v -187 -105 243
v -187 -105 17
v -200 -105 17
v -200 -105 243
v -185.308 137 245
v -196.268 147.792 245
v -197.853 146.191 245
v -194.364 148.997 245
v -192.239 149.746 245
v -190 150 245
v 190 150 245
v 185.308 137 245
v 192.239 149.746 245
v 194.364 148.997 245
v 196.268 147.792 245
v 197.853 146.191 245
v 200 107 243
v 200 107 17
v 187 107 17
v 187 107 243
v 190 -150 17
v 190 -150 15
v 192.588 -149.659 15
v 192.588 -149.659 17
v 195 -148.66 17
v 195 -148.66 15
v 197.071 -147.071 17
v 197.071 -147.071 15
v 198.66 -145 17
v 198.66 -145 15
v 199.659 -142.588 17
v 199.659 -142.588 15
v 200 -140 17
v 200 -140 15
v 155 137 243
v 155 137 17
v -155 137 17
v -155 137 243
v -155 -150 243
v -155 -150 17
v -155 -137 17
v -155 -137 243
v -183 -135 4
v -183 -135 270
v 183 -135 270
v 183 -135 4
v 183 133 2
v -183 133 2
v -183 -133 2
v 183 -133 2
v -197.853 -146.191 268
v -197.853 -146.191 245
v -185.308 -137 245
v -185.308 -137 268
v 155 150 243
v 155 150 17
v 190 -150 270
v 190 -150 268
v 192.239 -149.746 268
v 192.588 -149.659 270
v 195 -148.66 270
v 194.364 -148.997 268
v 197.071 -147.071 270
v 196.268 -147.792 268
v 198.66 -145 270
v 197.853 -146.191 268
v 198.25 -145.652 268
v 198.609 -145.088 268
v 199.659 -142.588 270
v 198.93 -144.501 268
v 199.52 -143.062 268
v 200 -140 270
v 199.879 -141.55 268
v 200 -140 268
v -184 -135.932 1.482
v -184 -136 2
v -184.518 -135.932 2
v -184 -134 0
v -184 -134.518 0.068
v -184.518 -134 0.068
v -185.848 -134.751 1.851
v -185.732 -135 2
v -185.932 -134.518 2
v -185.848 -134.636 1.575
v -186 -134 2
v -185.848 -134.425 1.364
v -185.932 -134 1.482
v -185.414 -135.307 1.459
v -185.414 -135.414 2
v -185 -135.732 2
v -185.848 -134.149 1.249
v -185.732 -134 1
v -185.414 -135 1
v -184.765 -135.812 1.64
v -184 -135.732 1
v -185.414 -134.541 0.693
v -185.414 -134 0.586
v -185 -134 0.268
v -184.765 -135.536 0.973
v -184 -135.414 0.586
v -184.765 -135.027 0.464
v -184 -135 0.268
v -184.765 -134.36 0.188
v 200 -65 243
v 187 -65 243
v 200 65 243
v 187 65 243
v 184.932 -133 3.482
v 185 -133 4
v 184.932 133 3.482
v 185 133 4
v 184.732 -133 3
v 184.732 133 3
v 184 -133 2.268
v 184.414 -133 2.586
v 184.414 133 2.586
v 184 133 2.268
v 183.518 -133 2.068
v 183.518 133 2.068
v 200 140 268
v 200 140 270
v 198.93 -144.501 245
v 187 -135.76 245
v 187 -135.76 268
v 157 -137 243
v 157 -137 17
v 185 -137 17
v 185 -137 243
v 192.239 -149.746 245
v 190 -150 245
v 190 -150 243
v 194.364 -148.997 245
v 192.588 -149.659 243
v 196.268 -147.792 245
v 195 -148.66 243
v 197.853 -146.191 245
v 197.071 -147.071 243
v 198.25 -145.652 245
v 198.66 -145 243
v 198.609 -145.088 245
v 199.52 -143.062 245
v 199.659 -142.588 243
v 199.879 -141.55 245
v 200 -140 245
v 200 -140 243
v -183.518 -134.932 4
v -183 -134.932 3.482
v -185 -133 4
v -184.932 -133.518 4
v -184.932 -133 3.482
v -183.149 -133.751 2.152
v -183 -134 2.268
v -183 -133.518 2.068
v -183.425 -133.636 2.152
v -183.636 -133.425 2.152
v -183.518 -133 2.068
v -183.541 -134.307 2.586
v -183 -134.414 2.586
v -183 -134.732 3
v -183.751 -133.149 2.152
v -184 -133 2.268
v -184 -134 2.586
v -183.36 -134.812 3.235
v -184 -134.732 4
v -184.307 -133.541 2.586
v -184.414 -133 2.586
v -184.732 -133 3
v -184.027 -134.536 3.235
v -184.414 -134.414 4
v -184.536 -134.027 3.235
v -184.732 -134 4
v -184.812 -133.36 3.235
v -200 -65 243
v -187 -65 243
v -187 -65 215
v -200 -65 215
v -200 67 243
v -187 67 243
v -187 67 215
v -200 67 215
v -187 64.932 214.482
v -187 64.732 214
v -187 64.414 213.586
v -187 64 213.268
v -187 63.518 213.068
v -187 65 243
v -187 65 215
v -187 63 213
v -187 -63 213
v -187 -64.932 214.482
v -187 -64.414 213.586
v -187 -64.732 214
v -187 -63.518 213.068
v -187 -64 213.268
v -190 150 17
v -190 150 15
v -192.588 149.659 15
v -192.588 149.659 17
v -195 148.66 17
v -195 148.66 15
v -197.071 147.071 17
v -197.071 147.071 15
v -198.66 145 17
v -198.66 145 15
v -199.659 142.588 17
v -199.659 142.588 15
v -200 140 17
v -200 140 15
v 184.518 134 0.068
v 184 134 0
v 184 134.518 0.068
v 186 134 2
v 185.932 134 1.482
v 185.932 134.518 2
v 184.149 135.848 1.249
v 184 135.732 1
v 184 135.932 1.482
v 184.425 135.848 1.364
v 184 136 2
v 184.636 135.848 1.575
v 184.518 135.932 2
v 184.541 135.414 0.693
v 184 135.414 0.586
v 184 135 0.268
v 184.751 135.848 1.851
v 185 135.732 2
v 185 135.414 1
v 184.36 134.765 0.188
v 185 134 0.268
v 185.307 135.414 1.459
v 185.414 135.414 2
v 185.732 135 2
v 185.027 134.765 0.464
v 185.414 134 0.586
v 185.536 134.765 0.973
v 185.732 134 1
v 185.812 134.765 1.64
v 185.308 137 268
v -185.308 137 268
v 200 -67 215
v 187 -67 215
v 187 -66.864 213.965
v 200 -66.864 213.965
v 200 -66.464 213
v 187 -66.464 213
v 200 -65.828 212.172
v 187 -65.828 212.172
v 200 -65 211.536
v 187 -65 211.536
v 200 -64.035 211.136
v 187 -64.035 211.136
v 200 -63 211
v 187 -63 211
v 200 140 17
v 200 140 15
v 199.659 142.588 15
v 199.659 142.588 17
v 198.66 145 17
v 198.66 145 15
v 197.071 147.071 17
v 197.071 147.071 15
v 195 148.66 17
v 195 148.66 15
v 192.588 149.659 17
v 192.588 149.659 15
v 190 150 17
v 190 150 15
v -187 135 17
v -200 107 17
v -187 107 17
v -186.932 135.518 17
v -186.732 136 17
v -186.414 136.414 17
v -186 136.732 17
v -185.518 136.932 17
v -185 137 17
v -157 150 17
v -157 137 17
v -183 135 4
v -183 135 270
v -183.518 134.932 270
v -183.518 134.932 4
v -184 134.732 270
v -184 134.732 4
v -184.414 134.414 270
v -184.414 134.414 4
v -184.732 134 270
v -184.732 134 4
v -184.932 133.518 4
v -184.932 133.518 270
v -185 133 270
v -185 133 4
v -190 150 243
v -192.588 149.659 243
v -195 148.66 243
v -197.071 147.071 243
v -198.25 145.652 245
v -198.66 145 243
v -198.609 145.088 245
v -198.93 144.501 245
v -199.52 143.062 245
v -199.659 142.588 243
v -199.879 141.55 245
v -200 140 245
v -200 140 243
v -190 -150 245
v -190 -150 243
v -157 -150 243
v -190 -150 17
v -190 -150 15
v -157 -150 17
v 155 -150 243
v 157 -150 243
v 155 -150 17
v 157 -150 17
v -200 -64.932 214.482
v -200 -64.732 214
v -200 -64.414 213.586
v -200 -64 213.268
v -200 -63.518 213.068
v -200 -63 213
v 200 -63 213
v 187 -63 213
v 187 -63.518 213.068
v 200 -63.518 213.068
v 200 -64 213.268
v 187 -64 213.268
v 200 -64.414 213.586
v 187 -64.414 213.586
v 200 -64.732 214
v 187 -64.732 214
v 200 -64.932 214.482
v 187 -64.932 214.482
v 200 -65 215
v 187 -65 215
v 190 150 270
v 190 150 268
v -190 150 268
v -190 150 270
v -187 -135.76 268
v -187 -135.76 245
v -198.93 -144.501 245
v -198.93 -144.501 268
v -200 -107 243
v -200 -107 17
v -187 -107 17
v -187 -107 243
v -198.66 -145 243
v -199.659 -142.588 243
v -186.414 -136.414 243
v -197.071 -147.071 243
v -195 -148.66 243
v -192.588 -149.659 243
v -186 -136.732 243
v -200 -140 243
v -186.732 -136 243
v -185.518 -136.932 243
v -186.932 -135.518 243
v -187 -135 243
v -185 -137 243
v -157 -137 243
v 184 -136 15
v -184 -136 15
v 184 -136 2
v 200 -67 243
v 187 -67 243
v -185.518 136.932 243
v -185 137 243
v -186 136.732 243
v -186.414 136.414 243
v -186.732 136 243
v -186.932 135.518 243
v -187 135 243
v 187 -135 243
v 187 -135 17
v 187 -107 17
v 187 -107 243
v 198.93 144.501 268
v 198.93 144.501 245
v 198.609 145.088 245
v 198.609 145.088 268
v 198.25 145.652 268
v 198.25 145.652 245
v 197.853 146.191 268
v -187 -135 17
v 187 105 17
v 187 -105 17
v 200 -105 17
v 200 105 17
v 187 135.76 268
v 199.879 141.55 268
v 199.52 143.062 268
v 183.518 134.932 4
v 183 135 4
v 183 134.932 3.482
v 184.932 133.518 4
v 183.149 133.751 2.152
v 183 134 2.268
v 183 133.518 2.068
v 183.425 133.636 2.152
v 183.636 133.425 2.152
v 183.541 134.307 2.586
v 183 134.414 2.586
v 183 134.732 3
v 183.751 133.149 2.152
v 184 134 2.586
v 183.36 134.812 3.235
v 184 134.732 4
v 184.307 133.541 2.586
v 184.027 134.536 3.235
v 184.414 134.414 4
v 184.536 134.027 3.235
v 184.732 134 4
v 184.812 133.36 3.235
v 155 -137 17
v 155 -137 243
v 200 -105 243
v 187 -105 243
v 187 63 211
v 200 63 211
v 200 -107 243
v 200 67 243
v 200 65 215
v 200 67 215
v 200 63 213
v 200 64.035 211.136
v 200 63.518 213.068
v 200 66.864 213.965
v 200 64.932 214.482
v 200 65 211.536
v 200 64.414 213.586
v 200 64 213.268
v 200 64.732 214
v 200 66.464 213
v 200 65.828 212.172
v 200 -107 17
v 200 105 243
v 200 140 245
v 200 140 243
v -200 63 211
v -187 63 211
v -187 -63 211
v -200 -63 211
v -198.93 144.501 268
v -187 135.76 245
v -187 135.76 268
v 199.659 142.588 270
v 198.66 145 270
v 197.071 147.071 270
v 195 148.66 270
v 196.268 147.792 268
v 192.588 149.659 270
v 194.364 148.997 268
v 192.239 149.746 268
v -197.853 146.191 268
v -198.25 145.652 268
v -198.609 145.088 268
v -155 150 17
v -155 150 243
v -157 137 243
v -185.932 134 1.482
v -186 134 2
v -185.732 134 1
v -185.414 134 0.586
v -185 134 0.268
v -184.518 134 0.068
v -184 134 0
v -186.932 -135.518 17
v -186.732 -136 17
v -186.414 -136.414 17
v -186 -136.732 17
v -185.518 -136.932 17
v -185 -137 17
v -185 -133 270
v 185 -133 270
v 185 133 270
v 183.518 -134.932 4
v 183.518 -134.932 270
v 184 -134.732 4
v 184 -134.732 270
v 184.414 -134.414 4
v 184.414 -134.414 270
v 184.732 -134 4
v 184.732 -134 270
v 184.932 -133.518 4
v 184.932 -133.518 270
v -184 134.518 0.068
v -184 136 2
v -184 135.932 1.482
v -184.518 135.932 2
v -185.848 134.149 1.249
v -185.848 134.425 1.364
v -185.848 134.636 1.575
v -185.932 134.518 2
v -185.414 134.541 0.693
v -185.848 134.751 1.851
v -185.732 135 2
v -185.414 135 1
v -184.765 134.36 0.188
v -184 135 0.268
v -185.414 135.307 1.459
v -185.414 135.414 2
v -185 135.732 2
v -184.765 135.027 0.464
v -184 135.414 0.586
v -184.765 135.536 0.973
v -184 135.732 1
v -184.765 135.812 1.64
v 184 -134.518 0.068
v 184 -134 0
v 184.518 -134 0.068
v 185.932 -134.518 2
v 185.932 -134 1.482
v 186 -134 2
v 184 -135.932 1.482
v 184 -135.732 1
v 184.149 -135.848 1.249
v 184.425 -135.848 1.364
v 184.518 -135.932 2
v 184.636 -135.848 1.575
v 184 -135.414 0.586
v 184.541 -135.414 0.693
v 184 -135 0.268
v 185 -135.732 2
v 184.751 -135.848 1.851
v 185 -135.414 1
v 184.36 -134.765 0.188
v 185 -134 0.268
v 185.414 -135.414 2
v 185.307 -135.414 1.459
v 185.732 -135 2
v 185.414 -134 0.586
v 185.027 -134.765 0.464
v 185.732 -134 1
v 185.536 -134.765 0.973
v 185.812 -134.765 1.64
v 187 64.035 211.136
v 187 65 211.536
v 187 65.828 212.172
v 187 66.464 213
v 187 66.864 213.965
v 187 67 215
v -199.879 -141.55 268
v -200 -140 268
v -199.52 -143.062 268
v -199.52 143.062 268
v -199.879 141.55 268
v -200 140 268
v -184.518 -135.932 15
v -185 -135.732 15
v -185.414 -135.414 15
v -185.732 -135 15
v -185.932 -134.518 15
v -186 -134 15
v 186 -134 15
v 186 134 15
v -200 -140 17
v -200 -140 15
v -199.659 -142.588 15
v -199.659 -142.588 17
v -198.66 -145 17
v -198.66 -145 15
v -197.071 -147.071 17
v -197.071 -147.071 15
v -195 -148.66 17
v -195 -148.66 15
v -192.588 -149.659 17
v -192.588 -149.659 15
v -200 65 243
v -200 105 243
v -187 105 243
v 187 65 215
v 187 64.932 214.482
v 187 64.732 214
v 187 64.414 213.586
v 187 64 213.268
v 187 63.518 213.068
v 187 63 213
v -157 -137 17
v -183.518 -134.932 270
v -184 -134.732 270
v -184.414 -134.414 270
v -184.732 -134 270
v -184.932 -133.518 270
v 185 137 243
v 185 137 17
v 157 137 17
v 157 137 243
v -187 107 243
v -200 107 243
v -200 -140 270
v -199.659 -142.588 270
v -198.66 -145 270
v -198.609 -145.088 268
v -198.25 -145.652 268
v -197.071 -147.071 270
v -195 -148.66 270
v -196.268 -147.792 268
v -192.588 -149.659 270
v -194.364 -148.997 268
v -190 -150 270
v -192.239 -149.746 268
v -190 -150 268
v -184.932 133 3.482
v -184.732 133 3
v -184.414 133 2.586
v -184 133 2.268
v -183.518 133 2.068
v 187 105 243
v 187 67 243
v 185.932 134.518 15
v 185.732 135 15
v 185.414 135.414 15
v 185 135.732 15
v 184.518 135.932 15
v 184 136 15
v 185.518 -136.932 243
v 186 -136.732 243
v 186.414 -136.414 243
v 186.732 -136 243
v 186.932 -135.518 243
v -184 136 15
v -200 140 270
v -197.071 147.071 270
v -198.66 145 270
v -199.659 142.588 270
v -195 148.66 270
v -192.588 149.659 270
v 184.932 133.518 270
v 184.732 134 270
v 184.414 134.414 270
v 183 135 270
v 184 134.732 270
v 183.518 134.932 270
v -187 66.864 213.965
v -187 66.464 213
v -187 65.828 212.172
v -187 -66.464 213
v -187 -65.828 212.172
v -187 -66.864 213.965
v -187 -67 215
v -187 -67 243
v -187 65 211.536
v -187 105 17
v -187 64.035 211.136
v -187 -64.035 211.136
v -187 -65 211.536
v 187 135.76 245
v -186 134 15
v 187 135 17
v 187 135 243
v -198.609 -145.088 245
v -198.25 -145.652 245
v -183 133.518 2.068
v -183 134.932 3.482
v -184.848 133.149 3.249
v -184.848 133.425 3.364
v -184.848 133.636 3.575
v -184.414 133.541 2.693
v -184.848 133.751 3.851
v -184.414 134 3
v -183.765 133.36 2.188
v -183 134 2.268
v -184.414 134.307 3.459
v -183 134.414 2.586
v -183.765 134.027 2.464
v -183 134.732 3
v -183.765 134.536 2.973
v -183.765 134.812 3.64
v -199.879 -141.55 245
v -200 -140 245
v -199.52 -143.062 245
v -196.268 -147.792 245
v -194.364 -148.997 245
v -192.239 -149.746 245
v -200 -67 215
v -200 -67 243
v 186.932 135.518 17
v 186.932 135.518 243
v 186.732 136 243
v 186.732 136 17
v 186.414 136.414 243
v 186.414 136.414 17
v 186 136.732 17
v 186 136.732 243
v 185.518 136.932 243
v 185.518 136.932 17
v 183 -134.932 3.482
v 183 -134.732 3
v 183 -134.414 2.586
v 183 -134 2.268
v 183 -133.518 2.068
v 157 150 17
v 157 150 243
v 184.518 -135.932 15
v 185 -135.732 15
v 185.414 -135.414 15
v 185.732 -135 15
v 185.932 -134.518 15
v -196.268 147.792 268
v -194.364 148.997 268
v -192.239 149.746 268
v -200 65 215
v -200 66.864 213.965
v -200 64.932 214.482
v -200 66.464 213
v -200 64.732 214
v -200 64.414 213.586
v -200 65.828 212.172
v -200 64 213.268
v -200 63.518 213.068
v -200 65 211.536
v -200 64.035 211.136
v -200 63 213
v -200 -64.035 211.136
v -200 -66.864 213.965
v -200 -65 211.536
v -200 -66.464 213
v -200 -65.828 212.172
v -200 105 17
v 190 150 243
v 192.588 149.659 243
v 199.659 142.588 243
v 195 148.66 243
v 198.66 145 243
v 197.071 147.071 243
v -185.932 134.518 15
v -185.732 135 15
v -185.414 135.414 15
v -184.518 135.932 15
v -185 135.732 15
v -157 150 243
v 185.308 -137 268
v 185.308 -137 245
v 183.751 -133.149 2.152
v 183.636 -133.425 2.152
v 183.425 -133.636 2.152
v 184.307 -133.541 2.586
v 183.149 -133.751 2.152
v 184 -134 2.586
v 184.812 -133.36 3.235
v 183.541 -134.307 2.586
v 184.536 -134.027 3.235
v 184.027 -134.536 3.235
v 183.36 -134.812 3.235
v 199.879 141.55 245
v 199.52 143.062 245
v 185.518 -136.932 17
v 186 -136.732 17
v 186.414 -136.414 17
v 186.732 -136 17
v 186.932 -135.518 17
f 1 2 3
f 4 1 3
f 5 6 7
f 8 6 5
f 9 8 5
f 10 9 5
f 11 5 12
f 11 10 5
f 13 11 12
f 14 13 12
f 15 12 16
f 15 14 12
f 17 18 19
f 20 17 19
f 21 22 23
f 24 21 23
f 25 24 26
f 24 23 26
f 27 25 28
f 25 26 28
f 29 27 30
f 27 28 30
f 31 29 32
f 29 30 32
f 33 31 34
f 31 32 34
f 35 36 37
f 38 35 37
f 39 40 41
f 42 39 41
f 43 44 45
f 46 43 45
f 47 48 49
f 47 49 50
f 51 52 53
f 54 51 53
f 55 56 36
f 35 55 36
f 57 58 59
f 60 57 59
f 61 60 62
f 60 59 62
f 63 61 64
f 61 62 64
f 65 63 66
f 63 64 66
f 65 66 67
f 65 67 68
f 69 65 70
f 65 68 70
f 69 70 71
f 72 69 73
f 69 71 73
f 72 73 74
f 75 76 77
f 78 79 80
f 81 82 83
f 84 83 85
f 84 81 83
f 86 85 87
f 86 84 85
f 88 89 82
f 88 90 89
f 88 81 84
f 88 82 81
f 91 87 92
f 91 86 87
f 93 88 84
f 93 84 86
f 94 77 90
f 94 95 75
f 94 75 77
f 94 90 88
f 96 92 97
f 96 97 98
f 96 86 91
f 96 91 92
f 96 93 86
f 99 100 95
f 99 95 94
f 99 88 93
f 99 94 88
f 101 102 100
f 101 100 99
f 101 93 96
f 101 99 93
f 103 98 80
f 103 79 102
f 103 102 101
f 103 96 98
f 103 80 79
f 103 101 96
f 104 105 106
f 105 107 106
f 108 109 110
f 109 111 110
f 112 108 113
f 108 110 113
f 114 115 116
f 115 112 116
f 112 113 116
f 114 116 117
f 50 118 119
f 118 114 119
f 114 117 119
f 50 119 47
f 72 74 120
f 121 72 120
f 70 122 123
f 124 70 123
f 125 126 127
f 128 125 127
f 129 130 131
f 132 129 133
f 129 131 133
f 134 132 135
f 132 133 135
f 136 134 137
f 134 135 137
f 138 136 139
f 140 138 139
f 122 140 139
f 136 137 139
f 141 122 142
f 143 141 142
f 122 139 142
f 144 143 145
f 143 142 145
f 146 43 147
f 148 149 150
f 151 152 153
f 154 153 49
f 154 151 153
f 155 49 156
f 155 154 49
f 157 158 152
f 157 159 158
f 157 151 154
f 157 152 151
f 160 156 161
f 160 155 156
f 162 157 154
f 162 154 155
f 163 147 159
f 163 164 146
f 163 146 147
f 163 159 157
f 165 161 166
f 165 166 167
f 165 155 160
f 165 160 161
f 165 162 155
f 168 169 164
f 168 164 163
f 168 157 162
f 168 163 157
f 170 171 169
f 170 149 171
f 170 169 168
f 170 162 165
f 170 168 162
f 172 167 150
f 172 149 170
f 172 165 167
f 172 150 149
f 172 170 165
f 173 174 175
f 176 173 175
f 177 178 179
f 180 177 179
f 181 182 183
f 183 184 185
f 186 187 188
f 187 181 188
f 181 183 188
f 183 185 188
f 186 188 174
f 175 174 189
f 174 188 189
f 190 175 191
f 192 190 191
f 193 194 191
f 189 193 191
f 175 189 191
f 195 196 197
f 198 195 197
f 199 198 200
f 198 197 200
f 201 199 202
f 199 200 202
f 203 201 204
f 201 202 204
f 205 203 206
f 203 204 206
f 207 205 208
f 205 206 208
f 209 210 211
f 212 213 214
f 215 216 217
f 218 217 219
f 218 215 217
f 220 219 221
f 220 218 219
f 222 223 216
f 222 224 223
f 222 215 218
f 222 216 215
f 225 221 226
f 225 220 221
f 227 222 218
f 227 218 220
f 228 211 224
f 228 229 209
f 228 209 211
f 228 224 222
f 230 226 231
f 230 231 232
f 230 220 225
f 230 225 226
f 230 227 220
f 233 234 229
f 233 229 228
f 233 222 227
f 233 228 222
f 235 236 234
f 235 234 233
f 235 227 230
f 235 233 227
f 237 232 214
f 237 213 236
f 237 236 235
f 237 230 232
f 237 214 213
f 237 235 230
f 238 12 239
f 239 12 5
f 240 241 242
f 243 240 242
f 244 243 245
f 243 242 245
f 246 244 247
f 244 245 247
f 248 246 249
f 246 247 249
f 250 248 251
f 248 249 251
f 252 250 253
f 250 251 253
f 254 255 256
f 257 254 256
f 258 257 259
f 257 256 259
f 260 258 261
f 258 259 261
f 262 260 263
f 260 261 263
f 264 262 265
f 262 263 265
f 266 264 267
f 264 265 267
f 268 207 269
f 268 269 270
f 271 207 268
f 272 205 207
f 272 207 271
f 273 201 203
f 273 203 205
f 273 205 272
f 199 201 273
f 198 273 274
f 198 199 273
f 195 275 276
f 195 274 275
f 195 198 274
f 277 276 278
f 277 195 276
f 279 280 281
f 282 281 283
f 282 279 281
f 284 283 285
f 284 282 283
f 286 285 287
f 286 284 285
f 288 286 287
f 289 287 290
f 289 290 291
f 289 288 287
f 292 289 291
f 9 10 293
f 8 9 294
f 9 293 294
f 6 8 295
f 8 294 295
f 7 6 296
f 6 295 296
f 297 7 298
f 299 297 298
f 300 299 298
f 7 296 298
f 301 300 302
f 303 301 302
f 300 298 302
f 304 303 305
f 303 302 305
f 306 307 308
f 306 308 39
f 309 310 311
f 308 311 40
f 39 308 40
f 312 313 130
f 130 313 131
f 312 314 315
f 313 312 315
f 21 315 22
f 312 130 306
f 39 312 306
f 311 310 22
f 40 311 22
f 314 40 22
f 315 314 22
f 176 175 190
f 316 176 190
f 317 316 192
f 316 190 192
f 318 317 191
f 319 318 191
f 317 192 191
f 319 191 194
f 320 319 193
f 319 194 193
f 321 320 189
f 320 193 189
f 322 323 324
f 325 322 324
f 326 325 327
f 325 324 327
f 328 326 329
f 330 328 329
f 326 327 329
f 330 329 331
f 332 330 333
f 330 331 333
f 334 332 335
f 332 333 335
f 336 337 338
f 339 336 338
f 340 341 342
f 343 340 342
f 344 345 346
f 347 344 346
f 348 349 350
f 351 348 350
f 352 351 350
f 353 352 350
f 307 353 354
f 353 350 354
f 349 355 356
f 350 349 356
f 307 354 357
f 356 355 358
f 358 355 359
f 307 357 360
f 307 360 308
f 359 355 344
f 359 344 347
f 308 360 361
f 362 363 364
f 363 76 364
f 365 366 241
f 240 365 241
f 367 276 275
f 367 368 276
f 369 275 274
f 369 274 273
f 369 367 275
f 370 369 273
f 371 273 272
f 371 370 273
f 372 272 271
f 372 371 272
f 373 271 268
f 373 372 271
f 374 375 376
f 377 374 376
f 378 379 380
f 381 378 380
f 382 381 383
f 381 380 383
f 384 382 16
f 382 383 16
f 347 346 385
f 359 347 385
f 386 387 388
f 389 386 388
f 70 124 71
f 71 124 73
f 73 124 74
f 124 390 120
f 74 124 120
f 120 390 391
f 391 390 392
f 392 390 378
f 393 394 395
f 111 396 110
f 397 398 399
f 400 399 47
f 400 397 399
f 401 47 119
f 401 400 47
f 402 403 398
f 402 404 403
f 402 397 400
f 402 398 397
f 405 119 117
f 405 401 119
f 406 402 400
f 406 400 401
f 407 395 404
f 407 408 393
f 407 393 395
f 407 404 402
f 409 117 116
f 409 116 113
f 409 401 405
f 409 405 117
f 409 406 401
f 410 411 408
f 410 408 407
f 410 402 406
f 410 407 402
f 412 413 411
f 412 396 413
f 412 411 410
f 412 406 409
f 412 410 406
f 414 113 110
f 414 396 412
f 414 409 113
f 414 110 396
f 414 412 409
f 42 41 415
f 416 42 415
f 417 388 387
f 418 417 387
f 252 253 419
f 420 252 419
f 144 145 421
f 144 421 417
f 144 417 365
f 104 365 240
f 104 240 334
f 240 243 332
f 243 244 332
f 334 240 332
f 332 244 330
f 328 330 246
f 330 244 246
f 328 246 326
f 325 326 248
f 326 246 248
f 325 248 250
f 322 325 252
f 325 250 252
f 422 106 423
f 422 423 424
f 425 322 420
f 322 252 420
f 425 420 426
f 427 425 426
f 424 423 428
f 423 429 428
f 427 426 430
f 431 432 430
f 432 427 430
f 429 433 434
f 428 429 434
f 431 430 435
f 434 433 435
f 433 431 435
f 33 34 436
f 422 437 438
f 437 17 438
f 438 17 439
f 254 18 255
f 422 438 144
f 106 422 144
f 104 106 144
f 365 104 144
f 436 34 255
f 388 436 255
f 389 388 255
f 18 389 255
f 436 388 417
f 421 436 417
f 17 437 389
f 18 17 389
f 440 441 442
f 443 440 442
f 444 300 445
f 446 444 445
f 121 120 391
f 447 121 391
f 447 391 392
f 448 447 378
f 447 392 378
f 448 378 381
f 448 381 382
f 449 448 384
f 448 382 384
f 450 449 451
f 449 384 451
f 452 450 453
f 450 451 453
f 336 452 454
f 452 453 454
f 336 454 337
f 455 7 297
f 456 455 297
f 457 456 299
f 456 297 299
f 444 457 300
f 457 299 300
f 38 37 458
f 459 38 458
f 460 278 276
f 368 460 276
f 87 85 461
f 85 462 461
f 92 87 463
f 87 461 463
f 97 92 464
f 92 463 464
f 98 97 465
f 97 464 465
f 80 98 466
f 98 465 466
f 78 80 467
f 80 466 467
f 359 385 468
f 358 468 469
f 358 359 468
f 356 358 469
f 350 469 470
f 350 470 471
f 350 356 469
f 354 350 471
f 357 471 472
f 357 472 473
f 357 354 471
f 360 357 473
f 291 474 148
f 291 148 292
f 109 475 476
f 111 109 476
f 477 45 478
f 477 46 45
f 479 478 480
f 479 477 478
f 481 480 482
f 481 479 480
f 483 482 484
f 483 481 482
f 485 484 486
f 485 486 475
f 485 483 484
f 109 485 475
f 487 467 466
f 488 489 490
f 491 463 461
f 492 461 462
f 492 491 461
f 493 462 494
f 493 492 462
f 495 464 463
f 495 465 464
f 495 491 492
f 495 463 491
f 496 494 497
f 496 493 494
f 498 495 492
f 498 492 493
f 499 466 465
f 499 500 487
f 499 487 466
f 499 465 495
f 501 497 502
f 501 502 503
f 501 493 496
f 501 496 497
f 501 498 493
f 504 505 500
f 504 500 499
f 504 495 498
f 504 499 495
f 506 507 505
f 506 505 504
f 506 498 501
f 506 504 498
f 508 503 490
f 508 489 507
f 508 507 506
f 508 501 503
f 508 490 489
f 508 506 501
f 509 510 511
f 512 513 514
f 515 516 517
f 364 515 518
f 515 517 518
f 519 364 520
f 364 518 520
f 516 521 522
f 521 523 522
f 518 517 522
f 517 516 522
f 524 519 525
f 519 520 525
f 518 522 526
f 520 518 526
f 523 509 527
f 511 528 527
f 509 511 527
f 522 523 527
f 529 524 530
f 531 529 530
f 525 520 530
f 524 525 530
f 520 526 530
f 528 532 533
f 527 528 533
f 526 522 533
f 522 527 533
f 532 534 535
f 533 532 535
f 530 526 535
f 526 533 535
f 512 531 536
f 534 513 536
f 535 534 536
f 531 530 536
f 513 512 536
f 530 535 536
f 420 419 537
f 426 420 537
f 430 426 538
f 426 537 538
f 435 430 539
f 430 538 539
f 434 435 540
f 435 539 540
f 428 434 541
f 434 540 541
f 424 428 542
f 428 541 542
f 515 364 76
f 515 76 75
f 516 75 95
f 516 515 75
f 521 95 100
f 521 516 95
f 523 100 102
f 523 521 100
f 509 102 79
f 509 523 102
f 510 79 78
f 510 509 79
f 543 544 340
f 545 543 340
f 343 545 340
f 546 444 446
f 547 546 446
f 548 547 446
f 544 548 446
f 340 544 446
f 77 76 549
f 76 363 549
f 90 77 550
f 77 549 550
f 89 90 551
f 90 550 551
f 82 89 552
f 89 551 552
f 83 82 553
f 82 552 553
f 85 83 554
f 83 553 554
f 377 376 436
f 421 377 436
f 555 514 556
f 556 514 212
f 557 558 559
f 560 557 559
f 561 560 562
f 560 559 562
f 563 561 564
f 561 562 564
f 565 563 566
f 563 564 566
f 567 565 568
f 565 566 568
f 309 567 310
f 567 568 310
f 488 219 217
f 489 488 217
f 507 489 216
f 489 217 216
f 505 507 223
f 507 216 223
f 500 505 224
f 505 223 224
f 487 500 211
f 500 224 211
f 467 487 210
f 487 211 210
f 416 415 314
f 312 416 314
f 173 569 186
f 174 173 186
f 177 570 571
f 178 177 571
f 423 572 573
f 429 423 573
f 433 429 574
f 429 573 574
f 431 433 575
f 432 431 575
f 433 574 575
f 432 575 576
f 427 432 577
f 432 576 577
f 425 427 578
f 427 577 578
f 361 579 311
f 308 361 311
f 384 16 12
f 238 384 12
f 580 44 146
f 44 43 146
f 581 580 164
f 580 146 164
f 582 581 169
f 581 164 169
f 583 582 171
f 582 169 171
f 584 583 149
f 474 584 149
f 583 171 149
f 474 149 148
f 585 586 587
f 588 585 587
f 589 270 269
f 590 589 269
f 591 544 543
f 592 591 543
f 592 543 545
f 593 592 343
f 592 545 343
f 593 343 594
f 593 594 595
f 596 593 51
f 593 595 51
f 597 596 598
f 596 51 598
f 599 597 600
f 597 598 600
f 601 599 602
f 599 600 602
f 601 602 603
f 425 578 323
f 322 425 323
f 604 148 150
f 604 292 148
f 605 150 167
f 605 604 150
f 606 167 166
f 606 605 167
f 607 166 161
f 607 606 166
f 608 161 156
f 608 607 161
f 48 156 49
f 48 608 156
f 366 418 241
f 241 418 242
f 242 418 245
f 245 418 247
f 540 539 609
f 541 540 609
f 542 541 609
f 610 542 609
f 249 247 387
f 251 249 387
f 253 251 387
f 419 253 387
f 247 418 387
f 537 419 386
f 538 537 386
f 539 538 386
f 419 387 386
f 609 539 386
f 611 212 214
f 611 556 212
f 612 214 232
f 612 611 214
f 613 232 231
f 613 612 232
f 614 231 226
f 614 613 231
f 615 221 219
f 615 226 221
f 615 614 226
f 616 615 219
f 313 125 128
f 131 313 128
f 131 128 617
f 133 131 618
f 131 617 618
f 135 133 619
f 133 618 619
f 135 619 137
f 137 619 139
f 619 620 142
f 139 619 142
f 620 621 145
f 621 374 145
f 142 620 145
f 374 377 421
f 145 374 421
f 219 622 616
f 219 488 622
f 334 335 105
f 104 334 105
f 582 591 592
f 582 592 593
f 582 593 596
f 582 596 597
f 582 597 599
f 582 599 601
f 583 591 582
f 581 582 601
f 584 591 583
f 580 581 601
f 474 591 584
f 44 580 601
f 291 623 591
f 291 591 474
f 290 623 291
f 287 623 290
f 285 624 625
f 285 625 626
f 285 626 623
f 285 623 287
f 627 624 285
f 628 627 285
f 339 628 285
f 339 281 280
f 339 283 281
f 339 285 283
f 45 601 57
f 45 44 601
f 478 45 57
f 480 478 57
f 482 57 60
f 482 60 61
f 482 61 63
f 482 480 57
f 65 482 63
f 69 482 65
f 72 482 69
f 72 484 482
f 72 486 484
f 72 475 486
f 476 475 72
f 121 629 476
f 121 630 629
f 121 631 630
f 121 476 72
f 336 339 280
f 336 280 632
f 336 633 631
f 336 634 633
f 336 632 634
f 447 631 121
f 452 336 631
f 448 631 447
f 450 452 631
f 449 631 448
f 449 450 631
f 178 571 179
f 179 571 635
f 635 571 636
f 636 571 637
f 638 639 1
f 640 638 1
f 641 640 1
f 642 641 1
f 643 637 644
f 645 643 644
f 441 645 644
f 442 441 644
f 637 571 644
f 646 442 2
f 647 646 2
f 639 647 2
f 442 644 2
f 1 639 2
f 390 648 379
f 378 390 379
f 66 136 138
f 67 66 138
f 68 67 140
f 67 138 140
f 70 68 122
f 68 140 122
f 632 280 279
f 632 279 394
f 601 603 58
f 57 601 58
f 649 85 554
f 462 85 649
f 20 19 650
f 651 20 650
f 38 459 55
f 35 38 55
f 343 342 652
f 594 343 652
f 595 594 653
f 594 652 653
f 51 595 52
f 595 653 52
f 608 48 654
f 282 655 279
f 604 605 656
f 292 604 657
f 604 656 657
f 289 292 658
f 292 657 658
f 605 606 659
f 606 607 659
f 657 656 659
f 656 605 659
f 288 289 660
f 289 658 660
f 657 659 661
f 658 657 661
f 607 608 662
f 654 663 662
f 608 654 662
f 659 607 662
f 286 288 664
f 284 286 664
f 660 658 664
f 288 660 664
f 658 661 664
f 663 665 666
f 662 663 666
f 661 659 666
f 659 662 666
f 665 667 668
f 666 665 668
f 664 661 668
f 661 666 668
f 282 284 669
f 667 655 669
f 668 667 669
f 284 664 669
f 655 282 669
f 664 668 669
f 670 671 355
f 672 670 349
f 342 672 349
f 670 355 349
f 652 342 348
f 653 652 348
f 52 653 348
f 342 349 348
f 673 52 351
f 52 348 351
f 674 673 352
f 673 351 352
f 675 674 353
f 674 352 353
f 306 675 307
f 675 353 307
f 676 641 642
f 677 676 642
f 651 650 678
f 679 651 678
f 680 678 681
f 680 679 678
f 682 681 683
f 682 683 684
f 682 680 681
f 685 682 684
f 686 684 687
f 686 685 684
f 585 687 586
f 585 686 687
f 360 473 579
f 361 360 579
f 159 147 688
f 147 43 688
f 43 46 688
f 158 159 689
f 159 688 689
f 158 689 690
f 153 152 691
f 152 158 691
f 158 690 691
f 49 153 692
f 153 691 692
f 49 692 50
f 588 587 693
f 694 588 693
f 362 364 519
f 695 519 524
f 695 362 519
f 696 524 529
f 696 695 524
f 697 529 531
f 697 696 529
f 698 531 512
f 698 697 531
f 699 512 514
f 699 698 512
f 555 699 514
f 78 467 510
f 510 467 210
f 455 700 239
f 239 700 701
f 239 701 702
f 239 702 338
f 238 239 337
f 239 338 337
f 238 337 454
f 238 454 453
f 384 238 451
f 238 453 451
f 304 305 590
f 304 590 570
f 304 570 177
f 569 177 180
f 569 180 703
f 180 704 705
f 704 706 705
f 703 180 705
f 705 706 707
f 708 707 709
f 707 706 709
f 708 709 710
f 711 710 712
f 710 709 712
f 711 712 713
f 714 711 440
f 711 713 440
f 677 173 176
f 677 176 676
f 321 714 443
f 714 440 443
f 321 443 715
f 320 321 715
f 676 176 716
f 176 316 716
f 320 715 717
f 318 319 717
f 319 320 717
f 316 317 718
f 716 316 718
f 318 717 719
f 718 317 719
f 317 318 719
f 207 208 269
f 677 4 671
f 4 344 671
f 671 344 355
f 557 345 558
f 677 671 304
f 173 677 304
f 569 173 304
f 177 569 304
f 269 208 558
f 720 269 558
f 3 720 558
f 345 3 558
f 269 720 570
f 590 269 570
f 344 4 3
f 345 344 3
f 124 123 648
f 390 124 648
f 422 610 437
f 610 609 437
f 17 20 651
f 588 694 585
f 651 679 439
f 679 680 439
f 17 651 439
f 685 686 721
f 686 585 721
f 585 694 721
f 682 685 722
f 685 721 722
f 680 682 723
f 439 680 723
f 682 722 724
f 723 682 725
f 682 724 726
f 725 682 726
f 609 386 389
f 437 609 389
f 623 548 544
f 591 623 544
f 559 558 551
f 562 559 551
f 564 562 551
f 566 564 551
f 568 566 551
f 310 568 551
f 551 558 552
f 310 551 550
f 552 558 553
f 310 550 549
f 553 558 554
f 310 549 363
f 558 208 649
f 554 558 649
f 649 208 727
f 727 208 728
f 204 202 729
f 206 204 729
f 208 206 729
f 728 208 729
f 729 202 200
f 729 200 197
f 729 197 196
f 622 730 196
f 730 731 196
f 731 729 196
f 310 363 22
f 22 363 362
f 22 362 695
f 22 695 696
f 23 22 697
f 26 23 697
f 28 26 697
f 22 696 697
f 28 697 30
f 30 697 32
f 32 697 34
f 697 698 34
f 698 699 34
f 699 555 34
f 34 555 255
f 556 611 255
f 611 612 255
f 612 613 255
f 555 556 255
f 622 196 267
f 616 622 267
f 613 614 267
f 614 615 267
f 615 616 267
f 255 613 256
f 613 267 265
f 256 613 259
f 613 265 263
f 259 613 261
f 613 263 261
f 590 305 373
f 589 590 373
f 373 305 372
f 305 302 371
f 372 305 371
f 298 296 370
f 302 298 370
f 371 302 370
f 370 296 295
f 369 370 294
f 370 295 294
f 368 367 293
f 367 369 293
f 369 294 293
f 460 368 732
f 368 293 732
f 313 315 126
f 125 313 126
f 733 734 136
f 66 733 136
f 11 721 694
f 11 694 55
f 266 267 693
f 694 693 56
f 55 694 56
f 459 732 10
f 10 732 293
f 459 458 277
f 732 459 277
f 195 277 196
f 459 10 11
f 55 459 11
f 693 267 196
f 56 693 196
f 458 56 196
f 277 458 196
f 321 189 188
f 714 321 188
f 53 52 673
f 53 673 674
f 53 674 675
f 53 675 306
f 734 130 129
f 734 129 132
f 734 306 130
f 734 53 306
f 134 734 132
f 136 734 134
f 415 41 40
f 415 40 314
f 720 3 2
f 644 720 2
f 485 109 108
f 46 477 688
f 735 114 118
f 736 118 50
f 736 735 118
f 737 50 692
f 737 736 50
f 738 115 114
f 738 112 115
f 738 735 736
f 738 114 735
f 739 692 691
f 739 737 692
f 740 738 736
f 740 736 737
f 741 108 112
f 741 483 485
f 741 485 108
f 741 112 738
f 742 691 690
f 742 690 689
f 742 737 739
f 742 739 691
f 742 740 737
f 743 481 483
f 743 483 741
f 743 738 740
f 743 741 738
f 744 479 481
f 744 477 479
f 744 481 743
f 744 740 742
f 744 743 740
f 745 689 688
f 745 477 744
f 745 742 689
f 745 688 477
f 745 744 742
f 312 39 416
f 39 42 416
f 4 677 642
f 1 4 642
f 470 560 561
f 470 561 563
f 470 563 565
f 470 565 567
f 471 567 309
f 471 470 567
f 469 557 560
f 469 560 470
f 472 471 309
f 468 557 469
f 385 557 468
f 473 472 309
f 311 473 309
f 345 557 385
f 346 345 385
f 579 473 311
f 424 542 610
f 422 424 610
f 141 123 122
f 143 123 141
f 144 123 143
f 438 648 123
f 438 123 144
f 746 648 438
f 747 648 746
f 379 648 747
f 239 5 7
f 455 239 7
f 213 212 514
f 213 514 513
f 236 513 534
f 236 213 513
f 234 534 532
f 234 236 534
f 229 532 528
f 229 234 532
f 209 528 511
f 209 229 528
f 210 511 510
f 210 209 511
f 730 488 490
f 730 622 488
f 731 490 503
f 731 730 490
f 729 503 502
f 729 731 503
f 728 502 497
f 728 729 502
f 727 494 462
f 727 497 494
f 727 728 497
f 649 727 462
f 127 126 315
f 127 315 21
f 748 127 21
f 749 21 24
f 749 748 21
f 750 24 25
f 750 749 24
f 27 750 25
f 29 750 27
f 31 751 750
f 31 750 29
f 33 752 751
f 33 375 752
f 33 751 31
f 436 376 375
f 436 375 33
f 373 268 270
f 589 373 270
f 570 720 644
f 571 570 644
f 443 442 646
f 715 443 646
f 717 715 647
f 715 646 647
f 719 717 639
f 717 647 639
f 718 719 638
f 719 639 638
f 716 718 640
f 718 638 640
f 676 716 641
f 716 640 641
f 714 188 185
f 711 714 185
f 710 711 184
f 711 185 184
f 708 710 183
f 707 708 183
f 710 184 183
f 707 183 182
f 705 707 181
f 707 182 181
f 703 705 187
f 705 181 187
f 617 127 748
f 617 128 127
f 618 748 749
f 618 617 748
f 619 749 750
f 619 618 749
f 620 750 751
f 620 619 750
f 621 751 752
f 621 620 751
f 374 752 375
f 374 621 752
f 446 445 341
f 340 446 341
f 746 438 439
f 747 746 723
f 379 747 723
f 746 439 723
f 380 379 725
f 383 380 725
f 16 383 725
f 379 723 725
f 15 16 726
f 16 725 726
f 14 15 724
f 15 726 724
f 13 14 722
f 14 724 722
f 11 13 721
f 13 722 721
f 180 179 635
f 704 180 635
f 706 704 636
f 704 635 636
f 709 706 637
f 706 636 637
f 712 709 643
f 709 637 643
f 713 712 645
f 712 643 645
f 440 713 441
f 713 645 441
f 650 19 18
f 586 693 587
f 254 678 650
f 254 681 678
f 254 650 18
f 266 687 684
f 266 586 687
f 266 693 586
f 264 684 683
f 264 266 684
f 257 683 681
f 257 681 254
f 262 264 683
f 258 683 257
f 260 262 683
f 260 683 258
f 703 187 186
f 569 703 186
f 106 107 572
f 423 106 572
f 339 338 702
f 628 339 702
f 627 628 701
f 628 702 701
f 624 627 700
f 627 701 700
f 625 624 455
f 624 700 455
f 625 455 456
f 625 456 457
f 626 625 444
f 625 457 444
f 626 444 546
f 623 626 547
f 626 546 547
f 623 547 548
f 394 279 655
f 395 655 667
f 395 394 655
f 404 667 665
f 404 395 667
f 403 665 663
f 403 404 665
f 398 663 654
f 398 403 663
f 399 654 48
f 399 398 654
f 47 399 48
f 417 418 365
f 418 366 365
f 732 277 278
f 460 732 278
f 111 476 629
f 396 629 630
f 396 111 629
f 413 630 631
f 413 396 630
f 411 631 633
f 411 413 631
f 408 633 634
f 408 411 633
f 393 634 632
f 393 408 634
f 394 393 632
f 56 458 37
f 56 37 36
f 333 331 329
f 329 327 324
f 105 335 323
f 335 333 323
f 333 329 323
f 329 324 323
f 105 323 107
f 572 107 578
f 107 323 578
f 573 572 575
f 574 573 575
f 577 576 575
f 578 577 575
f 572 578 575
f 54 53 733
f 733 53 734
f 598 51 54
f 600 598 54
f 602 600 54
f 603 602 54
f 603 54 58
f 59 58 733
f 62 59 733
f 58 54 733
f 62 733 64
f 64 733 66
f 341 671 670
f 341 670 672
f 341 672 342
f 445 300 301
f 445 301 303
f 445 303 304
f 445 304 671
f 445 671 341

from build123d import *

# Parameters (mm, degrees)
F0_W      = 372
F0_H      = 272
F1_DEPTH  = 15
F2_W      = 372
F2_H      = 272
F3_DEPTH  = 2
F5_DEPTH  = 226
F7_DEPTH  = 2
F9_DEPTH  = 23
F11_DEPTH = 2
F12_W     = 370
F12_H     = 270
F13_DEPTH = 268
F15_DEPTH = 13
F17_DEPTH = 13
F18_R     = 2


with BuildPart() as f1:
    # F0 (on Top) → F1 (new body)
    with BuildSketch(Plane.XY):
        Rectangle(F0_W, F0_H)
    extrude(amount=F1_DEPTH)

    # F2 (on face) → F3 (join)
    with BuildSketch(Plane.XY.offset(15)):
        with BuildLine():
            Line((-190, -150), (190, -150))
            ThreePointArc((190, -150), (197.0710678119, -147.0710678119), (200, -140))
            Line((200, -140), (200, 140))
            ThreePointArc((200, 140), (197.0710678119, 147.0710678119), (190, 150))
            Line((190, 150), (-190, 150))
            ThreePointArc((-190, 150), (-197.0710678119, 147.0710678119), (-200, 140))
            Line((-200, 140), (-200, -140))
            ThreePointArc((-200, -140), (-197.0710678119, -147.0710678119), (-190, -150))
        make_face()
        Rectangle(F2_W, F2_H, mode=Mode.SUBTRACT)
        Rectangle(F2_W, F2_H)
    extrude(amount=F3_DEPTH)

    # F4 (on face) → F5 (join)
    with BuildSketch(Plane.XY.offset(17)):
        Polygon((157, -137), (187, -137), (187, -107), (200, -107), (200, -105), (187, -105), (187, 105), (200, 105), (200, 107), (187, 107), (187, 137), (157, 137), (157, 150), (155, 150), (155, 137), (-155, 137), (-155, 150), (-157, 150), (-157, 137), (-187, 137), (-187, 107), (-200, 107), (-200, 105), (-187, 105), (-187, -105), (-200, -105), (-200, -107), (-187, -107), (-187, -137), (-157, -137), (-157, -150), (-155, -150), (-155, -137), (155, -137), (155, -150), (157, -150), align=None)
    extrude(amount=F5_DEPTH)

    # F6 (on face) → F7 (join)
    with BuildSketch(Plane.XY.offset(243)):
        with BuildLine():
            Line((190, 150), (-190, 150))
            ThreePointArc((-190, 150), (-197.0710678119, 147.0710678119), (-200, 140))
            Line((-200, 140), (-200, -140))
            ThreePointArc((-200, -140), (-197.0710678119, -147.0710678119), (-190, -150))
            Line((-190, -150), (190, -150))
            ThreePointArc((190, -150), (197.0710678119, -147.0710678119), (200, -140))
            Line((200, -140), (200, 140))
            ThreePointArc((200, 140), (197.0710678119, 147.0710678119), (190, 150))
        make_face()
    extrude(amount=F7_DEPTH)

    # F8 (on face) → F9 (join)
    with BuildSketch(Plane.XY.offset(245)):
        with BuildLine():
            Line((-185.3079227659, -137), (185.3079227659, -137))
            Line((185.3079227659, -137), (197.8531877713, -146.1909160735))
            ThreePointArc((197.8531877713, -146.1909160735), (198.4340605379, -145.3727667773), (198.9300207482, -144.5005254622))
            Line((198.9300207482, -144.5005254622), (187, -135.7603498338))
            Line((187, -135.7603498338), (187, 135.7603498338))
            Line((187, 135.7603498338), (198.9300207482, 144.5005254622))
            ThreePointArc((198.9300207482, 144.5005254622), (198.4340605379, 145.3727667773), (197.8531877713, 146.1909160735))
            Line((197.8531877713, 146.1909160735), (185.3079227659, 137))
            Line((185.3079227659, 137), (-185.3079227659, 137))
            Line((-185.3079227659, 137), (-197.8531877713, 146.1909160735))
            ThreePointArc((-197.8531877713, 146.1909160735), (-198.4340605379, 145.3727667773), (-198.9300207482, 144.5005254622))
            Line((-198.9300207482, 144.5005254622), (-187, 135.7603498338))
            Line((-187, 135.7603498338), (-187, -135.7603498338))
            Line((-187, -135.7603498338), (-198.9300207482, -144.5005254622))
            ThreePointArc((-198.9300207482, -144.5005254622), (-198.4340605379, -145.3727667773), (-197.8531877713, -146.1909160735))
            Line((-197.8531877713, -146.1909160735), (-185.3079227659, -137))
        make_face()
    extrude(amount=F9_DEPTH)

    # F10 (on face) → F11 (join)
    with BuildSketch(Plane.XY.offset(268)):
        with BuildLine():
            Line((-190, -150), (190, -150))
            ThreePointArc((190, -150), (197.0710678119, -147.0710678119), (200, -140))
            Line((200, -140), (200, 140))
            ThreePointArc((200, 140), (197.0710678119, 147.0710678119), (190, 150))
            Line((190, 150), (-190, 150))
            ThreePointArc((-190, 150), (-197.0710678119, 147.0710678119), (-200, 140))
            Line((-200, 140), (-200, -140))
            ThreePointArc((-200, -140), (-197.0710678119, -147.0710678119), (-190, -150))
        make_face()
    extrude(amount=F11_DEPTH)

    # F12 (on face) → F13 (cut)
    with BuildSketch(Plane.XY.offset(270)):
        Rectangle(F12_W, F12_H)
    extrude(amount=-F13_DEPTH, mode=Mode.SUBTRACT)

    # F14 (on face) → F15 (join, through all)
    with BuildSketch(Plane(origin=(-187, 0, 0), x_dir=(0, -1, 0), z_dir=(-1, 0, 0))):
        with BuildLine():
            Line((-63, 211), (63, 211))
            ThreePointArc((63, 211), (65.8284271247, 212.1715728753), (67, 215))
            Line((67, 215), (67, 243))
            Line((67, 243), (65, 243))
            Line((65, 243), (65, 215))
            ThreePointArc((65, 215), (64.4142135624, 213.5857864376), (63, 213))
            Line((63, 213), (-63, 213))
            ThreePointArc((-63, 213), (-64.4142135624, 213.5857864376), (-65, 215))
            Line((-65, 215), (-65, 243))
            Line((-65, 243), (-67, 243))
            Line((-67, 243), (-67, 215))
            ThreePointArc((-67, 215), (-65.8284271247, 212.1715728753), (-63, 211))
        make_face()
    extrude(amount=F15_DEPTH)

    # F16 (on face) → F17 (join, through all)
    with BuildSketch(Plane.YZ.offset(187)):
        with BuildLine():
            ThreePointArc((63, 211), (65.8284271247, 212.1715728753), (67, 215))
            Line((67, 215), (67, 243))
            Line((67, 243), (65, 243))
            Line((65, 243), (65, 215))
            ThreePointArc((65, 215), (64.4142135624, 213.5857864376), (63, 213))
            Line((63, 213), (-63, 213))
            ThreePointArc((-63, 213), (-64.4142135624, 213.5857864376), (-65, 215))
            Line((-65, 215), (-65, 243))
            Line((-65, 243), (-67, 243))
            Line((-67, 243), (-67, 215))
            ThreePointArc((-67, 215), (-65.8284271247, 212.1715728753), (-63, 211))
            Line((-63, 211), (63, 211))
        make_face()
    extrude(amount=F17_DEPTH)

    # F18
    f18_edges = [f1.edges().sort_by_distance(p)[0] for p in [
        (-185, -135, 136),
        (185, -135, 136),
        (185, 135, 136),
        (0, 135, 2),
        (185, 0, 2),
        (0, -135, 2),
        (-185, 0, 2),
        (-185, 135, 136),
        (187, -137, 130),
        (187, 137, 130),
        (-187, 137, 130),
        (-187, -137, 130),
        (186, 0, 0),
        (0, 136, 0),
        (186, 136, 7.5),
        (0, -136, 0),
        (186, -136, 7.5),
        (-186, -136, 7.5),
        (-186, 0, 0),
        (-186, 136, 7.5),
    ]]
    fillet(f18_edges, radius=F18_R)


solid = f1.part
